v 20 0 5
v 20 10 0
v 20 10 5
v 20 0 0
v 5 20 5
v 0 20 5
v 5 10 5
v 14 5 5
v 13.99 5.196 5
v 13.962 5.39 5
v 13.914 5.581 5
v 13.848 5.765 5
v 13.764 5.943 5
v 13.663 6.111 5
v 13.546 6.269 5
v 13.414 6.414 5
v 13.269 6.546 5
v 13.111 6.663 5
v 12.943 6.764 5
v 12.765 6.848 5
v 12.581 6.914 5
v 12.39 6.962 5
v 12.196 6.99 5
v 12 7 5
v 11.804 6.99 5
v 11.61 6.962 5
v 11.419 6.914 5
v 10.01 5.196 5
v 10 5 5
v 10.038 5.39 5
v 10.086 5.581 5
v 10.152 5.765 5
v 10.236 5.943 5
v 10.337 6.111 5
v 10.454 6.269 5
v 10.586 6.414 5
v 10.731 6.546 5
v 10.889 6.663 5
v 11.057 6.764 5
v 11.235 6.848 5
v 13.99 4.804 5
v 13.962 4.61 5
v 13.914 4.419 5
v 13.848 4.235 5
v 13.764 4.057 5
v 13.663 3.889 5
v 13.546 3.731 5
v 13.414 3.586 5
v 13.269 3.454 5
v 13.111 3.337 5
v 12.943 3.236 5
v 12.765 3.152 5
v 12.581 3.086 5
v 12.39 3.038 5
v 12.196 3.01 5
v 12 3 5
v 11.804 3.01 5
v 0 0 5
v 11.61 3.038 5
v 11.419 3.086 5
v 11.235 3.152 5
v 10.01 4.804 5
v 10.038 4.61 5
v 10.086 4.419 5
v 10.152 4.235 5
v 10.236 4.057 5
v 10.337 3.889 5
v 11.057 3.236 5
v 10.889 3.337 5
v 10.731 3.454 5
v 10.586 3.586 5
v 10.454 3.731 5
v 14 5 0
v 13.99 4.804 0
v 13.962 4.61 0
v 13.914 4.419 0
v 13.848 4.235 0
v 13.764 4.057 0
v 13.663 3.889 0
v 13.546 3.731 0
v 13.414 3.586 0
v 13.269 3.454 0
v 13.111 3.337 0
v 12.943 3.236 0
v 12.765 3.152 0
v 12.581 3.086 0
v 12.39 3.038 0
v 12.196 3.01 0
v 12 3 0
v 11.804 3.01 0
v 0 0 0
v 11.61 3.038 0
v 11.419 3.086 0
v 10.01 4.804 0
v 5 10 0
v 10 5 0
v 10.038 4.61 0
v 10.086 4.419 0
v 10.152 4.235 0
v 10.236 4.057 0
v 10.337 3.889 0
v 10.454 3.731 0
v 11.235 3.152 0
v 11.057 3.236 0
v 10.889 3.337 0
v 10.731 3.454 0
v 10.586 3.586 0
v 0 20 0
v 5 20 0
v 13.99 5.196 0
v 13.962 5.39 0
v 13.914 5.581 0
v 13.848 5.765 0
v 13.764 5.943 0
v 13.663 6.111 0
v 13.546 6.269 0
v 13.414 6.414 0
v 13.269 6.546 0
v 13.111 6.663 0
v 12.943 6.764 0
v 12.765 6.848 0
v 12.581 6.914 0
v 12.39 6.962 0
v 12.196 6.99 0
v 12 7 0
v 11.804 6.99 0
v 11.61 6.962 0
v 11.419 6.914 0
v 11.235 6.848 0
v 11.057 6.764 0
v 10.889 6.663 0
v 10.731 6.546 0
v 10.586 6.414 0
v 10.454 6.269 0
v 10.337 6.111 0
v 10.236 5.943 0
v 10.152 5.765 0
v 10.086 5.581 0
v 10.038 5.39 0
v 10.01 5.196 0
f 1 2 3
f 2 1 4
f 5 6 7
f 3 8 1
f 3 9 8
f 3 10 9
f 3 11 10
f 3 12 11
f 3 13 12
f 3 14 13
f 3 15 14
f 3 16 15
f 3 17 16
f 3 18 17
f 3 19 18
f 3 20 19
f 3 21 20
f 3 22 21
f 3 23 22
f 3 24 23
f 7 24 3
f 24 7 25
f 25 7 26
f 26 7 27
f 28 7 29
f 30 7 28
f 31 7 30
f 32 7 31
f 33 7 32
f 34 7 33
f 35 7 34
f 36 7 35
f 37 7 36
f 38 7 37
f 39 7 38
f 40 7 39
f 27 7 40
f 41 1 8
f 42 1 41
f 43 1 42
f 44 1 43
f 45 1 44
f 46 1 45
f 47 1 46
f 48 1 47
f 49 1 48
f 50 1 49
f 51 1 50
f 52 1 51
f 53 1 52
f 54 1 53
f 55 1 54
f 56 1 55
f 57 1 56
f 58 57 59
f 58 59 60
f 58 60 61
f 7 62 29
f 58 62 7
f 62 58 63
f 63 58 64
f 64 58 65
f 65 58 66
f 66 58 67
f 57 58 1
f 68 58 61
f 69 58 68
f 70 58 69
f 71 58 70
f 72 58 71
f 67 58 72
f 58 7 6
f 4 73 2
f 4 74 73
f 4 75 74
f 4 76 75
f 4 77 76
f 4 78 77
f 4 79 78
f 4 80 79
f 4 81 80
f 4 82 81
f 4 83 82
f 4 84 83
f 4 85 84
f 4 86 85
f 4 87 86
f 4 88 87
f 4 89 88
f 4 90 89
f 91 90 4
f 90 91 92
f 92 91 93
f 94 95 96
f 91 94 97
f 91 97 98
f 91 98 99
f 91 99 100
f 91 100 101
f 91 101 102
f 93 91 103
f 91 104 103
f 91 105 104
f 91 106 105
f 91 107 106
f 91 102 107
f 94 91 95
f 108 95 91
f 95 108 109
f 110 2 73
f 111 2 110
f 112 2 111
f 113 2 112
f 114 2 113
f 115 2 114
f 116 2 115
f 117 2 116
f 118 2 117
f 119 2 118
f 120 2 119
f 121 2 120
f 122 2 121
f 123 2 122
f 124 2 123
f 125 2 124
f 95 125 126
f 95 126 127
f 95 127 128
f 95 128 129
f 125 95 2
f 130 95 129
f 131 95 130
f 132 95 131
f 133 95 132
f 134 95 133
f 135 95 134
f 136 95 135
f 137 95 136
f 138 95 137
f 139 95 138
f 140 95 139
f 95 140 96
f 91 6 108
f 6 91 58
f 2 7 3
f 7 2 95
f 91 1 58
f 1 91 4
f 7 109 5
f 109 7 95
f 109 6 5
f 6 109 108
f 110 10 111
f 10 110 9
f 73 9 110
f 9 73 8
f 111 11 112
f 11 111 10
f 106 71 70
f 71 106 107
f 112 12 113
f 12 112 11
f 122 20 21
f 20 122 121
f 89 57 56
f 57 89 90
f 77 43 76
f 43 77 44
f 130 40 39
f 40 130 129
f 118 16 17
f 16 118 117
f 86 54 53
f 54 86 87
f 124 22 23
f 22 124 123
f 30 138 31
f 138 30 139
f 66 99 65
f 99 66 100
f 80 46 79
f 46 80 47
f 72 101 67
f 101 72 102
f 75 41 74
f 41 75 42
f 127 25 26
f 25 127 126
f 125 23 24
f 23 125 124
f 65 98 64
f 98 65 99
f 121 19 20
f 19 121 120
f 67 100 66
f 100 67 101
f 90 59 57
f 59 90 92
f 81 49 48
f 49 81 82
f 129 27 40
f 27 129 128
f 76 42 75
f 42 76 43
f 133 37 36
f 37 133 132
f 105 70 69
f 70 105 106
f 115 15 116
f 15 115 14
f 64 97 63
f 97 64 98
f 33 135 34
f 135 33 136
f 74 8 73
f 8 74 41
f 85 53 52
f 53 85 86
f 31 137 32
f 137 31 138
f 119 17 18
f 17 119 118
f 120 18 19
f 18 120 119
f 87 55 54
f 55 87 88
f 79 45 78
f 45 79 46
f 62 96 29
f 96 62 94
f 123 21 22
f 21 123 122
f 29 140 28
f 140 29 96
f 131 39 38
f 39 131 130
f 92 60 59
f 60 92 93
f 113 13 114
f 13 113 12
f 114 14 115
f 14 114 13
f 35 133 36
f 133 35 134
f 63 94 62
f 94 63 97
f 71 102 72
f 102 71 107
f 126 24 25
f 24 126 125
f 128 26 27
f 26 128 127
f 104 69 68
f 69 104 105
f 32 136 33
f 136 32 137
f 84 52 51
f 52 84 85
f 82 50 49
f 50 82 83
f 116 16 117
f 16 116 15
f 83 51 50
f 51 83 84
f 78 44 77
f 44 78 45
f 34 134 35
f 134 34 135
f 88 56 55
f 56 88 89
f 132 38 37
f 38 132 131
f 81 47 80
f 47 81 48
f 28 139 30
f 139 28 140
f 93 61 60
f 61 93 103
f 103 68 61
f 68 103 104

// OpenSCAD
// An L-shaped block with a round hole: no symmetry, so a wrong transform shows.
turn = false;    // turned 180 deg about Z
mirrored = false; // mirrored in X

module body() difference() {
    union() {
        cube([20, 10, 5]);
        cube([5, 20, 5]);
    }
    translate([12, 5, -1]) cylinder(r = 2, h = 7, $fn = 64);
}

rotate([0, 0, turn ? 180 : 0])
    if (mirrored) mirror([1, 0, 0]) body();
    else body();
